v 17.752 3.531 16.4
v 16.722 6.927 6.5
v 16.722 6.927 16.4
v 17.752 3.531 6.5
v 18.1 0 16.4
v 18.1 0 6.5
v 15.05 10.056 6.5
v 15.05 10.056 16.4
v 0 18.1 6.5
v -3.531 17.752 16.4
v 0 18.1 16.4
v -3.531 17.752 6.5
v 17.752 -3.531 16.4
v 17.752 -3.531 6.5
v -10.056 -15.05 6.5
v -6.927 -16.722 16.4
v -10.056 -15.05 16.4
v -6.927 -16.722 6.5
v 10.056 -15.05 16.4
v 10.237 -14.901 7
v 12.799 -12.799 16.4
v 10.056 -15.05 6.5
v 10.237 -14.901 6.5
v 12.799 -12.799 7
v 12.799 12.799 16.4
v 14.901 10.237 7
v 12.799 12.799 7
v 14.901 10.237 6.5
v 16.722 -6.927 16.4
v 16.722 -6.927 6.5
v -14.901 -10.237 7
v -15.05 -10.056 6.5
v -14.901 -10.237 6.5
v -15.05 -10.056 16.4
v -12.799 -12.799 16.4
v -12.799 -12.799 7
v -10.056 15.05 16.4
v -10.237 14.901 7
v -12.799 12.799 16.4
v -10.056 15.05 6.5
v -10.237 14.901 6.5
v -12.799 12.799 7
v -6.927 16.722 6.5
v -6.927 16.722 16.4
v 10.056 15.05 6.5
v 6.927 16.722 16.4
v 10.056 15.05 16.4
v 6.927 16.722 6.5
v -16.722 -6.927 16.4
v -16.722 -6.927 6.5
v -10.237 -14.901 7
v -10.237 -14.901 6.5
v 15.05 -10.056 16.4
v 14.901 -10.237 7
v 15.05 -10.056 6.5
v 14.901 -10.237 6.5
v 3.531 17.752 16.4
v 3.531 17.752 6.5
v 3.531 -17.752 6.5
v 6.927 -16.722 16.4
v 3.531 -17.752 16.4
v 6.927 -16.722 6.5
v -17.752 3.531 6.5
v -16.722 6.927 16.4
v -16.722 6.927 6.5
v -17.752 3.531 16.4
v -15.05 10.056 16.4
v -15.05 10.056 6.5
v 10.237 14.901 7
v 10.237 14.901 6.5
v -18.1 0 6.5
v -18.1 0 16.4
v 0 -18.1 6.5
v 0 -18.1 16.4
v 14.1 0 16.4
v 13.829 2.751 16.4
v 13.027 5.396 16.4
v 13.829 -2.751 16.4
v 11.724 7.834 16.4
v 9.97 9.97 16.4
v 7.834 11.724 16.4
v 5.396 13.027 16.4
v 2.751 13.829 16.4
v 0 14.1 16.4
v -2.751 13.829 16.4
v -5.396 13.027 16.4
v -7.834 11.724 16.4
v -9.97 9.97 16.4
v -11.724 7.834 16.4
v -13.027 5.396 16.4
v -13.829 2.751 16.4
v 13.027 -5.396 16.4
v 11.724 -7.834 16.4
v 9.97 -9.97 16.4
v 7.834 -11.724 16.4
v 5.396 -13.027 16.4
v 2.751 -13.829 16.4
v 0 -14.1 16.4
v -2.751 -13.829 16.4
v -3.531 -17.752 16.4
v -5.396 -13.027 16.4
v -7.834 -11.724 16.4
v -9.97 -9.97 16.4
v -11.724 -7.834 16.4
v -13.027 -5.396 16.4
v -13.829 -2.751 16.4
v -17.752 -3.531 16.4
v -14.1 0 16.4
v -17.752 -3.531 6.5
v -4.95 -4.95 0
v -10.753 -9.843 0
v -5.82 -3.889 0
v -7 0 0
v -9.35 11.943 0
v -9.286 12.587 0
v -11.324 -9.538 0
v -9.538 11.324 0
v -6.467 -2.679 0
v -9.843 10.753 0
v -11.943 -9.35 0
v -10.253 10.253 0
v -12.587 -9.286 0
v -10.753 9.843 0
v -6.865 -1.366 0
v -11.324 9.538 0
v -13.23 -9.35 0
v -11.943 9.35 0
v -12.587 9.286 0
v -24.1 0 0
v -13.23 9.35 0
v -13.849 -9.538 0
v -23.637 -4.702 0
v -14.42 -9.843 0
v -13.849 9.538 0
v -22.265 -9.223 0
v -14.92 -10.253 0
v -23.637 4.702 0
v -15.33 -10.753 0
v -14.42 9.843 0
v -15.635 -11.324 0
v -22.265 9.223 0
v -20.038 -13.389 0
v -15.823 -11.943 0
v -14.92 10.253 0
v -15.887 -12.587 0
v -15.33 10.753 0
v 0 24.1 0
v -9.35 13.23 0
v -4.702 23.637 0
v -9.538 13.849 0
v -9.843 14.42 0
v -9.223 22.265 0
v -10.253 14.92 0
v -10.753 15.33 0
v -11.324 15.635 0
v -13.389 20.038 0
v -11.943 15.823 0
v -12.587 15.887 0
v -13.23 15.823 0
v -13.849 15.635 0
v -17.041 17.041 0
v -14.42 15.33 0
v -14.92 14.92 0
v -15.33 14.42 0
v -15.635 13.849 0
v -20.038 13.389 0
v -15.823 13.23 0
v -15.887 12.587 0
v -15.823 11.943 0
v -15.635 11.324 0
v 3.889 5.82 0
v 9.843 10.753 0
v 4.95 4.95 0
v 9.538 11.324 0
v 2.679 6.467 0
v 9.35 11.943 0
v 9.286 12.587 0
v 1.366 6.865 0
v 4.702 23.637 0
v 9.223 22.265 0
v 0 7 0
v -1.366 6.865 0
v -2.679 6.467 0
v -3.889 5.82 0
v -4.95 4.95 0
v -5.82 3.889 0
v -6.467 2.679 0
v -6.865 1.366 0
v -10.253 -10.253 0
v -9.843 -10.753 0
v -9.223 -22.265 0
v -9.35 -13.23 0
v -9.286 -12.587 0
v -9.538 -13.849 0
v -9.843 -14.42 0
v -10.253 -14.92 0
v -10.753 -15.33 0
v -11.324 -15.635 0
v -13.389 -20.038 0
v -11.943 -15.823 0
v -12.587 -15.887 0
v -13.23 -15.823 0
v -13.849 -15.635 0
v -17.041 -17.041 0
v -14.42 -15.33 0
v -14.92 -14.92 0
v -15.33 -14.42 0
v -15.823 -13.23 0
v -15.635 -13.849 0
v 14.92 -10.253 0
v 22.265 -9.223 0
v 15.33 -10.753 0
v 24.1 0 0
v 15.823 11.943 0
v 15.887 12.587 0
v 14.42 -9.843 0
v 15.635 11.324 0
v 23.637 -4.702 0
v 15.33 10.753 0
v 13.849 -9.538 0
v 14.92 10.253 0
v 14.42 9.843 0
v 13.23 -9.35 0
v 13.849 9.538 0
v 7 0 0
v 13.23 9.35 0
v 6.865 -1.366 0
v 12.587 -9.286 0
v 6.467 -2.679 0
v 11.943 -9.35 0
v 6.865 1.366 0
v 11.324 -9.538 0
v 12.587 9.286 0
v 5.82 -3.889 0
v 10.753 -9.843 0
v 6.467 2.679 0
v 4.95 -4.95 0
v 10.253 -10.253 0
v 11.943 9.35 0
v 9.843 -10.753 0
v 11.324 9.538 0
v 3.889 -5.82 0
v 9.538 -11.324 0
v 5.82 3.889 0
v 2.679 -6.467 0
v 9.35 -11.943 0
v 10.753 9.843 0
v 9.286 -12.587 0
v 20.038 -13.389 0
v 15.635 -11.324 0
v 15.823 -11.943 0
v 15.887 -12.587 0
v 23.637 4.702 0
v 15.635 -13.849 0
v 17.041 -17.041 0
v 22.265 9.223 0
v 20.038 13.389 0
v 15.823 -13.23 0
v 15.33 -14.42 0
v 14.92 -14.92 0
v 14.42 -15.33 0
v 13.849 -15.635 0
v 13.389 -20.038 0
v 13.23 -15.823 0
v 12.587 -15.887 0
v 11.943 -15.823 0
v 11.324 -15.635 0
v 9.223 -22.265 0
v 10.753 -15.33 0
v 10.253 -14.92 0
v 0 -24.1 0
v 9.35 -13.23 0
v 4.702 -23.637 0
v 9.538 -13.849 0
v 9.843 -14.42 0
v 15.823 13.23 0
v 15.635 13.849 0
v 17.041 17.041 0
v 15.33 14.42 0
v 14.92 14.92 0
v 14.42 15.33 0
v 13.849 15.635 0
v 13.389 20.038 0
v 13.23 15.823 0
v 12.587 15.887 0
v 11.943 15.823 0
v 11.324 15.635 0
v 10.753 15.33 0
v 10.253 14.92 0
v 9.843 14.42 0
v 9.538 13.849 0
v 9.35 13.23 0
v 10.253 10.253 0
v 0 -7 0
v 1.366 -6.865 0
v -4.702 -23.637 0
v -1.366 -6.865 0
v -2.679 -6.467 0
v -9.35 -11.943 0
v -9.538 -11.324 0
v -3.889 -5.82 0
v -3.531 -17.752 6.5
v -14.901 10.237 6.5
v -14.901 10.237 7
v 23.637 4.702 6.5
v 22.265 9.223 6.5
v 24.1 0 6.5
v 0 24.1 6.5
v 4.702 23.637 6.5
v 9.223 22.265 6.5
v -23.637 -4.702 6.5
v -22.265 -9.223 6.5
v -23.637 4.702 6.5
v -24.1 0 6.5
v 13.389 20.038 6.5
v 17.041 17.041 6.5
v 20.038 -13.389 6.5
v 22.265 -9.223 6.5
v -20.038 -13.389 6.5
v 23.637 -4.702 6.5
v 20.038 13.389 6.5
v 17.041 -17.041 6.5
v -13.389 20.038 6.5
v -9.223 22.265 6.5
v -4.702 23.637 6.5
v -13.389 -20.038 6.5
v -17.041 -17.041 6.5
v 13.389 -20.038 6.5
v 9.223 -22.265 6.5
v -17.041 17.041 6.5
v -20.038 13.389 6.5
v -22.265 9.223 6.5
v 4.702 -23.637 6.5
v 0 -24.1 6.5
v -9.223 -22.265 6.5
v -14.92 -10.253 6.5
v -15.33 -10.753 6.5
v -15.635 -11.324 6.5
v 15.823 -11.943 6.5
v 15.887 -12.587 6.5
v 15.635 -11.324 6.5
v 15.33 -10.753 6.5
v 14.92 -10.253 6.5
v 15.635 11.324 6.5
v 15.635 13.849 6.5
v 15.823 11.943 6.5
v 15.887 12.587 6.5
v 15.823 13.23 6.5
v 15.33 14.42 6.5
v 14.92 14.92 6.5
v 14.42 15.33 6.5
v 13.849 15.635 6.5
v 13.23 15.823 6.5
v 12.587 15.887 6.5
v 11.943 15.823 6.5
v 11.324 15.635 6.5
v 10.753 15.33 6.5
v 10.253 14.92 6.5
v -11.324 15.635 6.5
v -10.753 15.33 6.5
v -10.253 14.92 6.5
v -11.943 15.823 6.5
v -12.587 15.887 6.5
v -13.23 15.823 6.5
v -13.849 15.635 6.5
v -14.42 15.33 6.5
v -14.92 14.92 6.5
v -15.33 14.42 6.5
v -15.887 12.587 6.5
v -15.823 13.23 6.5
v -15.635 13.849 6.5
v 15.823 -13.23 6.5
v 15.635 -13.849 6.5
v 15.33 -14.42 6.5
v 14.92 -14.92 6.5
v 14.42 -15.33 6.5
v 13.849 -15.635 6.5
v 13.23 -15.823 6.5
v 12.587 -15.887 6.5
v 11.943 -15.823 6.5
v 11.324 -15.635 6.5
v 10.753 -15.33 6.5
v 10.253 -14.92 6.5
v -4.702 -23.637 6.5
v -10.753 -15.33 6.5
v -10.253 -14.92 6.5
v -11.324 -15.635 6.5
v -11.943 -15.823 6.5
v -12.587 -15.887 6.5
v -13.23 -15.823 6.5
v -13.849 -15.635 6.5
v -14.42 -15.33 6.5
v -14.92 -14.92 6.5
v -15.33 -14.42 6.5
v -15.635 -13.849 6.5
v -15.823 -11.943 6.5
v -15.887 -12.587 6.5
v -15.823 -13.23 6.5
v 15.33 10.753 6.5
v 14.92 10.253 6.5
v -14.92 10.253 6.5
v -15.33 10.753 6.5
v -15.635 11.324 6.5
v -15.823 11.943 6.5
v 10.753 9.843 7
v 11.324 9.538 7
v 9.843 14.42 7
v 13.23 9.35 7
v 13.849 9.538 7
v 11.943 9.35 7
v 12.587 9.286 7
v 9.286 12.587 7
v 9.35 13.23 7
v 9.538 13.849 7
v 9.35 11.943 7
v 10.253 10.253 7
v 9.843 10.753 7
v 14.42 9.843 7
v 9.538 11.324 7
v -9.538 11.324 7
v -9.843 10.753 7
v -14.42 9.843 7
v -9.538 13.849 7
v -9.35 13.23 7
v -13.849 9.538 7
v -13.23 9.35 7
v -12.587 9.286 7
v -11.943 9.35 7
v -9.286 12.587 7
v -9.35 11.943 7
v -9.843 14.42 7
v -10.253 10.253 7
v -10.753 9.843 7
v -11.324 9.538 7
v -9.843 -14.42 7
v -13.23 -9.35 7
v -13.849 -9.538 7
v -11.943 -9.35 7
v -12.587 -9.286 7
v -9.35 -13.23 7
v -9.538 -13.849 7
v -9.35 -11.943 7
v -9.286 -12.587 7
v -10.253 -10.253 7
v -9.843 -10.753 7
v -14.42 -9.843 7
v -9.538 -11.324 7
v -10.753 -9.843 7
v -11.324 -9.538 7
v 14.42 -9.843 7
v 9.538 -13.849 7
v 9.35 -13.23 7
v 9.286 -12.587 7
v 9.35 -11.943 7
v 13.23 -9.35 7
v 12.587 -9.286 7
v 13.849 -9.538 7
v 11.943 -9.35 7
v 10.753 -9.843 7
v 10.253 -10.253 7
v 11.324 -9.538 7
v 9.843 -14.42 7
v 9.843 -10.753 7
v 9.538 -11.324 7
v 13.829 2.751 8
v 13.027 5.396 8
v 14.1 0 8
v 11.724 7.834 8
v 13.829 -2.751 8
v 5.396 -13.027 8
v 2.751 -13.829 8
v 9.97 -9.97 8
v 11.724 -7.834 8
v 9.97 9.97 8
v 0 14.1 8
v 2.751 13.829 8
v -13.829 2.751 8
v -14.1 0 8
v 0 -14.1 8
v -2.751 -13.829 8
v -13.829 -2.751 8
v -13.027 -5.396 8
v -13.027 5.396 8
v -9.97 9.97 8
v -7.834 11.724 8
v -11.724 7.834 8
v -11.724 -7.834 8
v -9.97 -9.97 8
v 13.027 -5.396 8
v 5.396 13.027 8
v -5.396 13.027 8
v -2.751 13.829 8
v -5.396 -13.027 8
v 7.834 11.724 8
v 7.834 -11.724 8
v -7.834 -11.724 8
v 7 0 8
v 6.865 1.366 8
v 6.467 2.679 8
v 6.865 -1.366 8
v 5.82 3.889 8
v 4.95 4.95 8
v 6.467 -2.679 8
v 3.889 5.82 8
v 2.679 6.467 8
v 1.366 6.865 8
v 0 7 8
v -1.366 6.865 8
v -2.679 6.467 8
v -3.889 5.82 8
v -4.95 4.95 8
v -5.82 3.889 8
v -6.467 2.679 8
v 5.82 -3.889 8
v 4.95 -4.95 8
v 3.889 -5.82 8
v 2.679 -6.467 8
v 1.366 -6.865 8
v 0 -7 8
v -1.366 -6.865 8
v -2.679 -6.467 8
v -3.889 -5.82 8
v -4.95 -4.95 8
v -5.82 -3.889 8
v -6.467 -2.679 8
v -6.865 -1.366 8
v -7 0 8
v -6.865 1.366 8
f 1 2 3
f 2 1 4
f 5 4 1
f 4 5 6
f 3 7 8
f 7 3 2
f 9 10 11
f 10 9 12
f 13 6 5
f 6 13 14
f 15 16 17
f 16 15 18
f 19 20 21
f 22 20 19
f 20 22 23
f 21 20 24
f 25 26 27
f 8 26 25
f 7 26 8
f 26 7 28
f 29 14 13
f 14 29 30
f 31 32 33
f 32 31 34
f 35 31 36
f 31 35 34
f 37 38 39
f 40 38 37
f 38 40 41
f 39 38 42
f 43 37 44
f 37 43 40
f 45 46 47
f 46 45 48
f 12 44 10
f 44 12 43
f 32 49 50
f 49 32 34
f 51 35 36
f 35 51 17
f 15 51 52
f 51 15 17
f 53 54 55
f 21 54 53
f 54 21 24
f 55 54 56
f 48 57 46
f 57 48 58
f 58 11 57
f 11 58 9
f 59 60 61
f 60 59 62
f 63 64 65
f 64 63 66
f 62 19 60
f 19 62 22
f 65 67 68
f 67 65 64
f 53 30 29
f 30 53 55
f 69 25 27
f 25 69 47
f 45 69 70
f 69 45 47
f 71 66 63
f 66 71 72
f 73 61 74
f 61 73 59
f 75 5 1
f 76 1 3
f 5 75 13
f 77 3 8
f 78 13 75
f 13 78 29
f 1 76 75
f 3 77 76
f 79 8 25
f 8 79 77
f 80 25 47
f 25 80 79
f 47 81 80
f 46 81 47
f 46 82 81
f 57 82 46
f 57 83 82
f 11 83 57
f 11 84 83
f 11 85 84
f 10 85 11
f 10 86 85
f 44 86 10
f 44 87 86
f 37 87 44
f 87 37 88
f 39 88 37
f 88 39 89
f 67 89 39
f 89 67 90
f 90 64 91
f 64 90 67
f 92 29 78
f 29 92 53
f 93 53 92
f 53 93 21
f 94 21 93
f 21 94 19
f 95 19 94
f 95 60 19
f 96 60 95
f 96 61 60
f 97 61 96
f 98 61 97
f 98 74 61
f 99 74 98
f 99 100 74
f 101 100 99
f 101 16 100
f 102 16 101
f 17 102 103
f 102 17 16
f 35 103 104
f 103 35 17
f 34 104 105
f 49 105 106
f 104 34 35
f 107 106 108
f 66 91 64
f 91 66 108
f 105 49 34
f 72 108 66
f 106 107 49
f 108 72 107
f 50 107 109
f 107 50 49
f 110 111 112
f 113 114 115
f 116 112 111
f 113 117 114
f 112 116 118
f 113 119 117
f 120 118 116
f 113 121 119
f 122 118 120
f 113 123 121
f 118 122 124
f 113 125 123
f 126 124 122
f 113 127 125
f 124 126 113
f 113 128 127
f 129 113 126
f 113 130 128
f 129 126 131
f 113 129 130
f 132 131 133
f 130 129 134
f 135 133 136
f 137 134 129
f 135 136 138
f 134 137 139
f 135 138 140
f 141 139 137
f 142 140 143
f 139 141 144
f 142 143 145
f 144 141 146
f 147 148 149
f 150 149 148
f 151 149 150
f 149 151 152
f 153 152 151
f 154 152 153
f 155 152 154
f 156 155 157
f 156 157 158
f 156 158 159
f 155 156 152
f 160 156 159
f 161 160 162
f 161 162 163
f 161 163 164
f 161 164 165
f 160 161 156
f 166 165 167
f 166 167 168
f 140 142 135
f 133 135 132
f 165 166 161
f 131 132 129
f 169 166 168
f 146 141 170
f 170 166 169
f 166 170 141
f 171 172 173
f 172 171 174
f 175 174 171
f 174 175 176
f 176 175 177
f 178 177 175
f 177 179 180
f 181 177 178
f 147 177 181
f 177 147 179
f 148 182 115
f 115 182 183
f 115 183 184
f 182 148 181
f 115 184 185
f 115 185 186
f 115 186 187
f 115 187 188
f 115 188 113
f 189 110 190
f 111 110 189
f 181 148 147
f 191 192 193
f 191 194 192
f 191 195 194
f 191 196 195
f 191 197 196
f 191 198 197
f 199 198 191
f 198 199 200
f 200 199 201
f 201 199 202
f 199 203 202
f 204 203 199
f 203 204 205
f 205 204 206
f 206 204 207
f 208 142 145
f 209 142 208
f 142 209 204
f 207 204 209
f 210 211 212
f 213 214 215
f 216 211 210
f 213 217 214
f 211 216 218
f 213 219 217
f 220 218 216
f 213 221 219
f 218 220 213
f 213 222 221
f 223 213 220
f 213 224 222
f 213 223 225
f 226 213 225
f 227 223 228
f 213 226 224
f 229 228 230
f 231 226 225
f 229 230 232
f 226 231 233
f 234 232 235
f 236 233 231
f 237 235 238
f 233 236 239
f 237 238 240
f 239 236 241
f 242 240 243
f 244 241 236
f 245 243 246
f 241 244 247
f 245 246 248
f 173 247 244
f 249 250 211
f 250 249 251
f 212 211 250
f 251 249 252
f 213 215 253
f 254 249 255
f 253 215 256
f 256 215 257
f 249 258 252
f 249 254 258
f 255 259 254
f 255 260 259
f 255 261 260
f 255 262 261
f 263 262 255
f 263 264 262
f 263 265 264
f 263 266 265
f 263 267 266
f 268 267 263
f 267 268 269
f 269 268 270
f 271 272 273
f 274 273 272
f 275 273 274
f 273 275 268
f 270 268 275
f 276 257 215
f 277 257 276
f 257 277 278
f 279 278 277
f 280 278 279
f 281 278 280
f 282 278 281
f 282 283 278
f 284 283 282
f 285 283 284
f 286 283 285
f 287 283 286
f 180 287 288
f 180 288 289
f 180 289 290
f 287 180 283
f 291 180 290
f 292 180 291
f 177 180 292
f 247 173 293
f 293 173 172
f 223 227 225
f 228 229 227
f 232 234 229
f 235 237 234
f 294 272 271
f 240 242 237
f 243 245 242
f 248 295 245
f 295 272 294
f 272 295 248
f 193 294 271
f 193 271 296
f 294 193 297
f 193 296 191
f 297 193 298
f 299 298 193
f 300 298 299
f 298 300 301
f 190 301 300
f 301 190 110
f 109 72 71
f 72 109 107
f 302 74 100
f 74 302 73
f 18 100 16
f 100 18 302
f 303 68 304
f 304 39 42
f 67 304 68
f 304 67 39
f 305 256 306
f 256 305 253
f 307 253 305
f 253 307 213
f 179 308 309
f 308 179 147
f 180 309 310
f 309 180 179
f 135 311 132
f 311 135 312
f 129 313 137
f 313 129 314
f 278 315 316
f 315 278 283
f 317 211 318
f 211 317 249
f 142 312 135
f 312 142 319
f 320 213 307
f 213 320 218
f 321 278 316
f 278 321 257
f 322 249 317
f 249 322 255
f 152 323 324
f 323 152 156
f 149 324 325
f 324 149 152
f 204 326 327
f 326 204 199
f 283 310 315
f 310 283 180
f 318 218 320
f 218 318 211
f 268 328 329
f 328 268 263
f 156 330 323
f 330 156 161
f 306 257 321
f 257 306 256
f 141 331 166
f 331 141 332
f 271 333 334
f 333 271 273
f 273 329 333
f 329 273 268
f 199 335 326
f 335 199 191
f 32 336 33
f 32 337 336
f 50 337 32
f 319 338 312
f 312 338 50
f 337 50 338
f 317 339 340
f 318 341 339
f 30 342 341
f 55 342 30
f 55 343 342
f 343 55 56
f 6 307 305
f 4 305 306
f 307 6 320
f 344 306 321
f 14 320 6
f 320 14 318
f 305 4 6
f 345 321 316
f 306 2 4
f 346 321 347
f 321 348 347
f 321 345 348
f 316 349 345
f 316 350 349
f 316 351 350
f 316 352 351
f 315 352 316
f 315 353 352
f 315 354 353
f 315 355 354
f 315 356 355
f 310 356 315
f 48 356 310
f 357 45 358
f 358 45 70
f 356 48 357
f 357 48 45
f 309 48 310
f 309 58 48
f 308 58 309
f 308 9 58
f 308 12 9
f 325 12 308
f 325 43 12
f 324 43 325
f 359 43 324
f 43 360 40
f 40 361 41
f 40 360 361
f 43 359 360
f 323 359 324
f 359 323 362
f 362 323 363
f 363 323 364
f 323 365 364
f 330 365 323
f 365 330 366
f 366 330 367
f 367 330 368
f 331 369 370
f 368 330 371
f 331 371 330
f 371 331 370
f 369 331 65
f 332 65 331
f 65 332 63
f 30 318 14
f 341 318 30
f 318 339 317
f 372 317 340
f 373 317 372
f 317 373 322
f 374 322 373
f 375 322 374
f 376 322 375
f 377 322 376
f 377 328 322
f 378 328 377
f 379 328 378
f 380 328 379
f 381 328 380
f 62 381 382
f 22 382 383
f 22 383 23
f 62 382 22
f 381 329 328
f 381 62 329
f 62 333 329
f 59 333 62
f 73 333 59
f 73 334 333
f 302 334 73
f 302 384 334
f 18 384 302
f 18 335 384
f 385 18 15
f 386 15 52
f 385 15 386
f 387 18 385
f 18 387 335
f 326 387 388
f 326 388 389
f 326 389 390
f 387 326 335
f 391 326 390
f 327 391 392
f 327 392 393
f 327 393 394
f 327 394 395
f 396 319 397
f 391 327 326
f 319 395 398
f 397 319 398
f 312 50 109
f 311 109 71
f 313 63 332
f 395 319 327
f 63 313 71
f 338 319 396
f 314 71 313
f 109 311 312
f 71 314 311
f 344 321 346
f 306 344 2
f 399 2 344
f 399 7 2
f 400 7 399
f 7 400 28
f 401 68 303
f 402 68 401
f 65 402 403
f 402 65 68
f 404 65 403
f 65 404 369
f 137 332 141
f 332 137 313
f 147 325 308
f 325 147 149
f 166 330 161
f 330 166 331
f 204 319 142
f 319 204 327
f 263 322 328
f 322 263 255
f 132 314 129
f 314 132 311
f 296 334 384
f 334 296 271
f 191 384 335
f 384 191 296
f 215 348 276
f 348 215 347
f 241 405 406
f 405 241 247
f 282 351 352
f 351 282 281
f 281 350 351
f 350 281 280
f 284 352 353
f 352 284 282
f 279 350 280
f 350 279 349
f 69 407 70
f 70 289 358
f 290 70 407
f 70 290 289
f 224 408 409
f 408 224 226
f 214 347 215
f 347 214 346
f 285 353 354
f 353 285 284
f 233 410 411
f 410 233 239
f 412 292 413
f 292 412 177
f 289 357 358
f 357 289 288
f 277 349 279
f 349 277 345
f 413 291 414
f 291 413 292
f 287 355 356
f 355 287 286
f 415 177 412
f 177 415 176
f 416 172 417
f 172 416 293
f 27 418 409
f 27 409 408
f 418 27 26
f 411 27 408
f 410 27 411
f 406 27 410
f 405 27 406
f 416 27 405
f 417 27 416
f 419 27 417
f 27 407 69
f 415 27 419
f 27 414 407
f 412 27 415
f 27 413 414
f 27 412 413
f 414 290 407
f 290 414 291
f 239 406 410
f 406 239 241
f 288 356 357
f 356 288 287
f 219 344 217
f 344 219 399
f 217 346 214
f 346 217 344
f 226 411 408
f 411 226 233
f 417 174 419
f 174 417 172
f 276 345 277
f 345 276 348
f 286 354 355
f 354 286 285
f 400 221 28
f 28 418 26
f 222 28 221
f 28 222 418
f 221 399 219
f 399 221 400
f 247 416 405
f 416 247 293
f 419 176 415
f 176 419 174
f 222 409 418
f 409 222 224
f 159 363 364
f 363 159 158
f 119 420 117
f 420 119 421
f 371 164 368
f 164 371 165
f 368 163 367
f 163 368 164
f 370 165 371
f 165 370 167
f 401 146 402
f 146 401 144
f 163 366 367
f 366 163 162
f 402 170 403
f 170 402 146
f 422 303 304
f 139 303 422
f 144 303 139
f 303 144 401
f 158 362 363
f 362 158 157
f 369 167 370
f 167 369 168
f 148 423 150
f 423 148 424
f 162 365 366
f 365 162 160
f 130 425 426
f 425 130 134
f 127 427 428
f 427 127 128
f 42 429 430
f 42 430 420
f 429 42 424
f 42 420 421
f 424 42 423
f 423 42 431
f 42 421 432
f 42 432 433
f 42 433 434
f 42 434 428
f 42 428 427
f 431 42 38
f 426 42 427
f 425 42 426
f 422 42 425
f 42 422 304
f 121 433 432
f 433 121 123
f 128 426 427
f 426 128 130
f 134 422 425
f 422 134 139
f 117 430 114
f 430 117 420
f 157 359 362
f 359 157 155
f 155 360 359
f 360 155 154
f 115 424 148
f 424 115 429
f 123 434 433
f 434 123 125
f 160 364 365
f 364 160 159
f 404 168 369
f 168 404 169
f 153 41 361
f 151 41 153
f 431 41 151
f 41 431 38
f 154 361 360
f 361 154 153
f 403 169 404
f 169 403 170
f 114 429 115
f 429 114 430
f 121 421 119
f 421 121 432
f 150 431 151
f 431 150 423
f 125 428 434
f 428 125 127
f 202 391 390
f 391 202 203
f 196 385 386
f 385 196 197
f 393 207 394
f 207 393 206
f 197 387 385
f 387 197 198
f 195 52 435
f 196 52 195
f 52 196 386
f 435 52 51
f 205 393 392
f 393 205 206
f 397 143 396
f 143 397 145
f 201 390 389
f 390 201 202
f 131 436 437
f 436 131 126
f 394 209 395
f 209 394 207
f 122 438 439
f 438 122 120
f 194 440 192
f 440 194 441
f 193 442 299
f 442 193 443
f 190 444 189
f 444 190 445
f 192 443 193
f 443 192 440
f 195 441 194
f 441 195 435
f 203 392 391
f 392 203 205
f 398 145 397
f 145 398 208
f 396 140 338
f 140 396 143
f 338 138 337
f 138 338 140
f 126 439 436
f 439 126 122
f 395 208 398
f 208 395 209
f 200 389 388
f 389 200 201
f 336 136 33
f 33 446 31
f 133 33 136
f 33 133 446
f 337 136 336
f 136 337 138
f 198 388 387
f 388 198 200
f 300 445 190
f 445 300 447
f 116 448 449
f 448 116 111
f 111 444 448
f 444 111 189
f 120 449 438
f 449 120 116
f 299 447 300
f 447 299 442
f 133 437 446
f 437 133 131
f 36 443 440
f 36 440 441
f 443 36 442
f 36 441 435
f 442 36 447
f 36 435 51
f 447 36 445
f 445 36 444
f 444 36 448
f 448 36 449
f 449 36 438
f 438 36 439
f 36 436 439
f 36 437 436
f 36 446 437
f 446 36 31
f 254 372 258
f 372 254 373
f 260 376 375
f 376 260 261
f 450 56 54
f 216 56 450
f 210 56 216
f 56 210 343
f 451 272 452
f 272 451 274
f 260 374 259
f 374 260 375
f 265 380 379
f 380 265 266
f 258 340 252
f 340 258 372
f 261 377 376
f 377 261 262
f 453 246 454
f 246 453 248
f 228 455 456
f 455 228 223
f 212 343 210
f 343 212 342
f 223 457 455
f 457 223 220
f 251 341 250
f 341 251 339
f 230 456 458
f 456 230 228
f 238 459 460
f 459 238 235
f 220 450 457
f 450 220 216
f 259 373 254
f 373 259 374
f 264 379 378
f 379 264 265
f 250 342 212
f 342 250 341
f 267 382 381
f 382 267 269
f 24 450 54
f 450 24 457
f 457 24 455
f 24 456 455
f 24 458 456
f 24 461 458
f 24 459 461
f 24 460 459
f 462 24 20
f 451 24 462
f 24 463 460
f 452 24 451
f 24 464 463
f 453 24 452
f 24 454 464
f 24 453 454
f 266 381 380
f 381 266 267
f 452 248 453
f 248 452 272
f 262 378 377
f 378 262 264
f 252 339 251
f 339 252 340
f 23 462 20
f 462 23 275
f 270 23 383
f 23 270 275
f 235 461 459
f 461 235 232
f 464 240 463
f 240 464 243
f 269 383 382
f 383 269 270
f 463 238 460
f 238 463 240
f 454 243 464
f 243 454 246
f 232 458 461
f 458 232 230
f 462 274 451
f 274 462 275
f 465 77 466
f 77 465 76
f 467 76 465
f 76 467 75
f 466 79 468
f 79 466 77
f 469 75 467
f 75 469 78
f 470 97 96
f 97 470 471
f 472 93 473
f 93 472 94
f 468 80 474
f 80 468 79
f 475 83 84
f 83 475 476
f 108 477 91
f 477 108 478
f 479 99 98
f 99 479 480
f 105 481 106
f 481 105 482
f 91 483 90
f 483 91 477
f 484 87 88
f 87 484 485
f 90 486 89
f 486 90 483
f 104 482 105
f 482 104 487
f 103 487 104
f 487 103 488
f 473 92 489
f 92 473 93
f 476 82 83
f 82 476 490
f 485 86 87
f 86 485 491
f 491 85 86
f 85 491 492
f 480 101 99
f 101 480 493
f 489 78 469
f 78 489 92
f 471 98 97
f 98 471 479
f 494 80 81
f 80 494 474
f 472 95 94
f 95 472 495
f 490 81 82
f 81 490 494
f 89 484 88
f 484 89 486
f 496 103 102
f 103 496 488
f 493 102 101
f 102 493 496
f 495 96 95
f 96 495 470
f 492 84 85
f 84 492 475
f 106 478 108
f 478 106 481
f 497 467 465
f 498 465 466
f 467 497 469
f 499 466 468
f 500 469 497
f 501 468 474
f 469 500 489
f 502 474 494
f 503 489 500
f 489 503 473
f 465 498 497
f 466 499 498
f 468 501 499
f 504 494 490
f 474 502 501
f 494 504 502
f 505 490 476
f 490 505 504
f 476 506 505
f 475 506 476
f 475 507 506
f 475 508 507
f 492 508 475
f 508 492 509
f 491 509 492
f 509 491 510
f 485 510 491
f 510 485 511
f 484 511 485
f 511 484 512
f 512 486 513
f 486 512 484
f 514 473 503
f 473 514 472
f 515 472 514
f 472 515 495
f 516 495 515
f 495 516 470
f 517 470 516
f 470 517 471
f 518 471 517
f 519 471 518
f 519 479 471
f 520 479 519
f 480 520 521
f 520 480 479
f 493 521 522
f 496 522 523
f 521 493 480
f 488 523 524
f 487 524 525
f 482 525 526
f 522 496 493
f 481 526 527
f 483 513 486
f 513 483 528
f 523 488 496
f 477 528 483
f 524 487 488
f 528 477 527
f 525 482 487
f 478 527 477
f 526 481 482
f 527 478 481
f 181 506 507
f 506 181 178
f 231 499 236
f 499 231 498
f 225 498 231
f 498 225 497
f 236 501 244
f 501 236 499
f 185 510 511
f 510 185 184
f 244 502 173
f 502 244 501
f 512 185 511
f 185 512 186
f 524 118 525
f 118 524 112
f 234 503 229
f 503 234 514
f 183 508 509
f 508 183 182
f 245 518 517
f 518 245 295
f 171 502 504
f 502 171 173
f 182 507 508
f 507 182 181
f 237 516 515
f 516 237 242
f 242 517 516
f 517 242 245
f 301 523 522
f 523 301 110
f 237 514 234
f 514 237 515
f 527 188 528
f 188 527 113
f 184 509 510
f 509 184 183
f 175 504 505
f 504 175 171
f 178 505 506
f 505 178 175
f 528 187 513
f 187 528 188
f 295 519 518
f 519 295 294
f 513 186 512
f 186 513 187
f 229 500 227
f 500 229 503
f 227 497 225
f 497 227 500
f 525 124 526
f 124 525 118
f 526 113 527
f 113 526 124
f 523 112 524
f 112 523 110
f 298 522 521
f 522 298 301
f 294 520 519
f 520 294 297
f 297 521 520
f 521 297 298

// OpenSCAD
$fn = 32;

// ----------------------------------------------------------------------
// Bearing housing: seat for 6001 (28 x 8 mm), 36.2 mm body
// ----------------------------------------------------------------------

// --- parameters (mm) ---
case_d = 36.2;            // housing outside diameter
case_h = 16.4;            // overall housing height
rim_t = 4;                // wall thickness
bearing_seat = 28.2;      // 6001 seat, 0.2 mm clearance
seat_h = 8.4;             // pocket depth
shoulder = 3;             // shoulder under the bearing
pass_d = 14;              // shaft passage
ear_d = 48.2;             // mounting flange diameter
flange_t = 5;             // flange thickness
bolt_d = 6.6;             // flange bolt clearance
bolt_r = 17.8;            // flange bolt circle radius

module body() {
  cylinder(h = case_h, d = case_d);
}

module flange() {
  /* flange sunk 1.5 mm into the body */
  cylinder(h = flange_t + 1.5, d = ear_d);
}

difference() {
  union() {
    body();
    flange();
  }
  translate([0, 0, case_h - seat_h]) cylinder(h = seat_h + 1, d = bearing_seat);
  translate([0, 0, -1]) cylinder(h = case_h - seat_h + 1, d = pass_d);
  for (i = [0 : 3]) rotate([0, 0, 45 + i * 90]) translate([bolt_r, 0, -1])
    cylinder(h = flange_t + 3, d = bolt_d);
}
